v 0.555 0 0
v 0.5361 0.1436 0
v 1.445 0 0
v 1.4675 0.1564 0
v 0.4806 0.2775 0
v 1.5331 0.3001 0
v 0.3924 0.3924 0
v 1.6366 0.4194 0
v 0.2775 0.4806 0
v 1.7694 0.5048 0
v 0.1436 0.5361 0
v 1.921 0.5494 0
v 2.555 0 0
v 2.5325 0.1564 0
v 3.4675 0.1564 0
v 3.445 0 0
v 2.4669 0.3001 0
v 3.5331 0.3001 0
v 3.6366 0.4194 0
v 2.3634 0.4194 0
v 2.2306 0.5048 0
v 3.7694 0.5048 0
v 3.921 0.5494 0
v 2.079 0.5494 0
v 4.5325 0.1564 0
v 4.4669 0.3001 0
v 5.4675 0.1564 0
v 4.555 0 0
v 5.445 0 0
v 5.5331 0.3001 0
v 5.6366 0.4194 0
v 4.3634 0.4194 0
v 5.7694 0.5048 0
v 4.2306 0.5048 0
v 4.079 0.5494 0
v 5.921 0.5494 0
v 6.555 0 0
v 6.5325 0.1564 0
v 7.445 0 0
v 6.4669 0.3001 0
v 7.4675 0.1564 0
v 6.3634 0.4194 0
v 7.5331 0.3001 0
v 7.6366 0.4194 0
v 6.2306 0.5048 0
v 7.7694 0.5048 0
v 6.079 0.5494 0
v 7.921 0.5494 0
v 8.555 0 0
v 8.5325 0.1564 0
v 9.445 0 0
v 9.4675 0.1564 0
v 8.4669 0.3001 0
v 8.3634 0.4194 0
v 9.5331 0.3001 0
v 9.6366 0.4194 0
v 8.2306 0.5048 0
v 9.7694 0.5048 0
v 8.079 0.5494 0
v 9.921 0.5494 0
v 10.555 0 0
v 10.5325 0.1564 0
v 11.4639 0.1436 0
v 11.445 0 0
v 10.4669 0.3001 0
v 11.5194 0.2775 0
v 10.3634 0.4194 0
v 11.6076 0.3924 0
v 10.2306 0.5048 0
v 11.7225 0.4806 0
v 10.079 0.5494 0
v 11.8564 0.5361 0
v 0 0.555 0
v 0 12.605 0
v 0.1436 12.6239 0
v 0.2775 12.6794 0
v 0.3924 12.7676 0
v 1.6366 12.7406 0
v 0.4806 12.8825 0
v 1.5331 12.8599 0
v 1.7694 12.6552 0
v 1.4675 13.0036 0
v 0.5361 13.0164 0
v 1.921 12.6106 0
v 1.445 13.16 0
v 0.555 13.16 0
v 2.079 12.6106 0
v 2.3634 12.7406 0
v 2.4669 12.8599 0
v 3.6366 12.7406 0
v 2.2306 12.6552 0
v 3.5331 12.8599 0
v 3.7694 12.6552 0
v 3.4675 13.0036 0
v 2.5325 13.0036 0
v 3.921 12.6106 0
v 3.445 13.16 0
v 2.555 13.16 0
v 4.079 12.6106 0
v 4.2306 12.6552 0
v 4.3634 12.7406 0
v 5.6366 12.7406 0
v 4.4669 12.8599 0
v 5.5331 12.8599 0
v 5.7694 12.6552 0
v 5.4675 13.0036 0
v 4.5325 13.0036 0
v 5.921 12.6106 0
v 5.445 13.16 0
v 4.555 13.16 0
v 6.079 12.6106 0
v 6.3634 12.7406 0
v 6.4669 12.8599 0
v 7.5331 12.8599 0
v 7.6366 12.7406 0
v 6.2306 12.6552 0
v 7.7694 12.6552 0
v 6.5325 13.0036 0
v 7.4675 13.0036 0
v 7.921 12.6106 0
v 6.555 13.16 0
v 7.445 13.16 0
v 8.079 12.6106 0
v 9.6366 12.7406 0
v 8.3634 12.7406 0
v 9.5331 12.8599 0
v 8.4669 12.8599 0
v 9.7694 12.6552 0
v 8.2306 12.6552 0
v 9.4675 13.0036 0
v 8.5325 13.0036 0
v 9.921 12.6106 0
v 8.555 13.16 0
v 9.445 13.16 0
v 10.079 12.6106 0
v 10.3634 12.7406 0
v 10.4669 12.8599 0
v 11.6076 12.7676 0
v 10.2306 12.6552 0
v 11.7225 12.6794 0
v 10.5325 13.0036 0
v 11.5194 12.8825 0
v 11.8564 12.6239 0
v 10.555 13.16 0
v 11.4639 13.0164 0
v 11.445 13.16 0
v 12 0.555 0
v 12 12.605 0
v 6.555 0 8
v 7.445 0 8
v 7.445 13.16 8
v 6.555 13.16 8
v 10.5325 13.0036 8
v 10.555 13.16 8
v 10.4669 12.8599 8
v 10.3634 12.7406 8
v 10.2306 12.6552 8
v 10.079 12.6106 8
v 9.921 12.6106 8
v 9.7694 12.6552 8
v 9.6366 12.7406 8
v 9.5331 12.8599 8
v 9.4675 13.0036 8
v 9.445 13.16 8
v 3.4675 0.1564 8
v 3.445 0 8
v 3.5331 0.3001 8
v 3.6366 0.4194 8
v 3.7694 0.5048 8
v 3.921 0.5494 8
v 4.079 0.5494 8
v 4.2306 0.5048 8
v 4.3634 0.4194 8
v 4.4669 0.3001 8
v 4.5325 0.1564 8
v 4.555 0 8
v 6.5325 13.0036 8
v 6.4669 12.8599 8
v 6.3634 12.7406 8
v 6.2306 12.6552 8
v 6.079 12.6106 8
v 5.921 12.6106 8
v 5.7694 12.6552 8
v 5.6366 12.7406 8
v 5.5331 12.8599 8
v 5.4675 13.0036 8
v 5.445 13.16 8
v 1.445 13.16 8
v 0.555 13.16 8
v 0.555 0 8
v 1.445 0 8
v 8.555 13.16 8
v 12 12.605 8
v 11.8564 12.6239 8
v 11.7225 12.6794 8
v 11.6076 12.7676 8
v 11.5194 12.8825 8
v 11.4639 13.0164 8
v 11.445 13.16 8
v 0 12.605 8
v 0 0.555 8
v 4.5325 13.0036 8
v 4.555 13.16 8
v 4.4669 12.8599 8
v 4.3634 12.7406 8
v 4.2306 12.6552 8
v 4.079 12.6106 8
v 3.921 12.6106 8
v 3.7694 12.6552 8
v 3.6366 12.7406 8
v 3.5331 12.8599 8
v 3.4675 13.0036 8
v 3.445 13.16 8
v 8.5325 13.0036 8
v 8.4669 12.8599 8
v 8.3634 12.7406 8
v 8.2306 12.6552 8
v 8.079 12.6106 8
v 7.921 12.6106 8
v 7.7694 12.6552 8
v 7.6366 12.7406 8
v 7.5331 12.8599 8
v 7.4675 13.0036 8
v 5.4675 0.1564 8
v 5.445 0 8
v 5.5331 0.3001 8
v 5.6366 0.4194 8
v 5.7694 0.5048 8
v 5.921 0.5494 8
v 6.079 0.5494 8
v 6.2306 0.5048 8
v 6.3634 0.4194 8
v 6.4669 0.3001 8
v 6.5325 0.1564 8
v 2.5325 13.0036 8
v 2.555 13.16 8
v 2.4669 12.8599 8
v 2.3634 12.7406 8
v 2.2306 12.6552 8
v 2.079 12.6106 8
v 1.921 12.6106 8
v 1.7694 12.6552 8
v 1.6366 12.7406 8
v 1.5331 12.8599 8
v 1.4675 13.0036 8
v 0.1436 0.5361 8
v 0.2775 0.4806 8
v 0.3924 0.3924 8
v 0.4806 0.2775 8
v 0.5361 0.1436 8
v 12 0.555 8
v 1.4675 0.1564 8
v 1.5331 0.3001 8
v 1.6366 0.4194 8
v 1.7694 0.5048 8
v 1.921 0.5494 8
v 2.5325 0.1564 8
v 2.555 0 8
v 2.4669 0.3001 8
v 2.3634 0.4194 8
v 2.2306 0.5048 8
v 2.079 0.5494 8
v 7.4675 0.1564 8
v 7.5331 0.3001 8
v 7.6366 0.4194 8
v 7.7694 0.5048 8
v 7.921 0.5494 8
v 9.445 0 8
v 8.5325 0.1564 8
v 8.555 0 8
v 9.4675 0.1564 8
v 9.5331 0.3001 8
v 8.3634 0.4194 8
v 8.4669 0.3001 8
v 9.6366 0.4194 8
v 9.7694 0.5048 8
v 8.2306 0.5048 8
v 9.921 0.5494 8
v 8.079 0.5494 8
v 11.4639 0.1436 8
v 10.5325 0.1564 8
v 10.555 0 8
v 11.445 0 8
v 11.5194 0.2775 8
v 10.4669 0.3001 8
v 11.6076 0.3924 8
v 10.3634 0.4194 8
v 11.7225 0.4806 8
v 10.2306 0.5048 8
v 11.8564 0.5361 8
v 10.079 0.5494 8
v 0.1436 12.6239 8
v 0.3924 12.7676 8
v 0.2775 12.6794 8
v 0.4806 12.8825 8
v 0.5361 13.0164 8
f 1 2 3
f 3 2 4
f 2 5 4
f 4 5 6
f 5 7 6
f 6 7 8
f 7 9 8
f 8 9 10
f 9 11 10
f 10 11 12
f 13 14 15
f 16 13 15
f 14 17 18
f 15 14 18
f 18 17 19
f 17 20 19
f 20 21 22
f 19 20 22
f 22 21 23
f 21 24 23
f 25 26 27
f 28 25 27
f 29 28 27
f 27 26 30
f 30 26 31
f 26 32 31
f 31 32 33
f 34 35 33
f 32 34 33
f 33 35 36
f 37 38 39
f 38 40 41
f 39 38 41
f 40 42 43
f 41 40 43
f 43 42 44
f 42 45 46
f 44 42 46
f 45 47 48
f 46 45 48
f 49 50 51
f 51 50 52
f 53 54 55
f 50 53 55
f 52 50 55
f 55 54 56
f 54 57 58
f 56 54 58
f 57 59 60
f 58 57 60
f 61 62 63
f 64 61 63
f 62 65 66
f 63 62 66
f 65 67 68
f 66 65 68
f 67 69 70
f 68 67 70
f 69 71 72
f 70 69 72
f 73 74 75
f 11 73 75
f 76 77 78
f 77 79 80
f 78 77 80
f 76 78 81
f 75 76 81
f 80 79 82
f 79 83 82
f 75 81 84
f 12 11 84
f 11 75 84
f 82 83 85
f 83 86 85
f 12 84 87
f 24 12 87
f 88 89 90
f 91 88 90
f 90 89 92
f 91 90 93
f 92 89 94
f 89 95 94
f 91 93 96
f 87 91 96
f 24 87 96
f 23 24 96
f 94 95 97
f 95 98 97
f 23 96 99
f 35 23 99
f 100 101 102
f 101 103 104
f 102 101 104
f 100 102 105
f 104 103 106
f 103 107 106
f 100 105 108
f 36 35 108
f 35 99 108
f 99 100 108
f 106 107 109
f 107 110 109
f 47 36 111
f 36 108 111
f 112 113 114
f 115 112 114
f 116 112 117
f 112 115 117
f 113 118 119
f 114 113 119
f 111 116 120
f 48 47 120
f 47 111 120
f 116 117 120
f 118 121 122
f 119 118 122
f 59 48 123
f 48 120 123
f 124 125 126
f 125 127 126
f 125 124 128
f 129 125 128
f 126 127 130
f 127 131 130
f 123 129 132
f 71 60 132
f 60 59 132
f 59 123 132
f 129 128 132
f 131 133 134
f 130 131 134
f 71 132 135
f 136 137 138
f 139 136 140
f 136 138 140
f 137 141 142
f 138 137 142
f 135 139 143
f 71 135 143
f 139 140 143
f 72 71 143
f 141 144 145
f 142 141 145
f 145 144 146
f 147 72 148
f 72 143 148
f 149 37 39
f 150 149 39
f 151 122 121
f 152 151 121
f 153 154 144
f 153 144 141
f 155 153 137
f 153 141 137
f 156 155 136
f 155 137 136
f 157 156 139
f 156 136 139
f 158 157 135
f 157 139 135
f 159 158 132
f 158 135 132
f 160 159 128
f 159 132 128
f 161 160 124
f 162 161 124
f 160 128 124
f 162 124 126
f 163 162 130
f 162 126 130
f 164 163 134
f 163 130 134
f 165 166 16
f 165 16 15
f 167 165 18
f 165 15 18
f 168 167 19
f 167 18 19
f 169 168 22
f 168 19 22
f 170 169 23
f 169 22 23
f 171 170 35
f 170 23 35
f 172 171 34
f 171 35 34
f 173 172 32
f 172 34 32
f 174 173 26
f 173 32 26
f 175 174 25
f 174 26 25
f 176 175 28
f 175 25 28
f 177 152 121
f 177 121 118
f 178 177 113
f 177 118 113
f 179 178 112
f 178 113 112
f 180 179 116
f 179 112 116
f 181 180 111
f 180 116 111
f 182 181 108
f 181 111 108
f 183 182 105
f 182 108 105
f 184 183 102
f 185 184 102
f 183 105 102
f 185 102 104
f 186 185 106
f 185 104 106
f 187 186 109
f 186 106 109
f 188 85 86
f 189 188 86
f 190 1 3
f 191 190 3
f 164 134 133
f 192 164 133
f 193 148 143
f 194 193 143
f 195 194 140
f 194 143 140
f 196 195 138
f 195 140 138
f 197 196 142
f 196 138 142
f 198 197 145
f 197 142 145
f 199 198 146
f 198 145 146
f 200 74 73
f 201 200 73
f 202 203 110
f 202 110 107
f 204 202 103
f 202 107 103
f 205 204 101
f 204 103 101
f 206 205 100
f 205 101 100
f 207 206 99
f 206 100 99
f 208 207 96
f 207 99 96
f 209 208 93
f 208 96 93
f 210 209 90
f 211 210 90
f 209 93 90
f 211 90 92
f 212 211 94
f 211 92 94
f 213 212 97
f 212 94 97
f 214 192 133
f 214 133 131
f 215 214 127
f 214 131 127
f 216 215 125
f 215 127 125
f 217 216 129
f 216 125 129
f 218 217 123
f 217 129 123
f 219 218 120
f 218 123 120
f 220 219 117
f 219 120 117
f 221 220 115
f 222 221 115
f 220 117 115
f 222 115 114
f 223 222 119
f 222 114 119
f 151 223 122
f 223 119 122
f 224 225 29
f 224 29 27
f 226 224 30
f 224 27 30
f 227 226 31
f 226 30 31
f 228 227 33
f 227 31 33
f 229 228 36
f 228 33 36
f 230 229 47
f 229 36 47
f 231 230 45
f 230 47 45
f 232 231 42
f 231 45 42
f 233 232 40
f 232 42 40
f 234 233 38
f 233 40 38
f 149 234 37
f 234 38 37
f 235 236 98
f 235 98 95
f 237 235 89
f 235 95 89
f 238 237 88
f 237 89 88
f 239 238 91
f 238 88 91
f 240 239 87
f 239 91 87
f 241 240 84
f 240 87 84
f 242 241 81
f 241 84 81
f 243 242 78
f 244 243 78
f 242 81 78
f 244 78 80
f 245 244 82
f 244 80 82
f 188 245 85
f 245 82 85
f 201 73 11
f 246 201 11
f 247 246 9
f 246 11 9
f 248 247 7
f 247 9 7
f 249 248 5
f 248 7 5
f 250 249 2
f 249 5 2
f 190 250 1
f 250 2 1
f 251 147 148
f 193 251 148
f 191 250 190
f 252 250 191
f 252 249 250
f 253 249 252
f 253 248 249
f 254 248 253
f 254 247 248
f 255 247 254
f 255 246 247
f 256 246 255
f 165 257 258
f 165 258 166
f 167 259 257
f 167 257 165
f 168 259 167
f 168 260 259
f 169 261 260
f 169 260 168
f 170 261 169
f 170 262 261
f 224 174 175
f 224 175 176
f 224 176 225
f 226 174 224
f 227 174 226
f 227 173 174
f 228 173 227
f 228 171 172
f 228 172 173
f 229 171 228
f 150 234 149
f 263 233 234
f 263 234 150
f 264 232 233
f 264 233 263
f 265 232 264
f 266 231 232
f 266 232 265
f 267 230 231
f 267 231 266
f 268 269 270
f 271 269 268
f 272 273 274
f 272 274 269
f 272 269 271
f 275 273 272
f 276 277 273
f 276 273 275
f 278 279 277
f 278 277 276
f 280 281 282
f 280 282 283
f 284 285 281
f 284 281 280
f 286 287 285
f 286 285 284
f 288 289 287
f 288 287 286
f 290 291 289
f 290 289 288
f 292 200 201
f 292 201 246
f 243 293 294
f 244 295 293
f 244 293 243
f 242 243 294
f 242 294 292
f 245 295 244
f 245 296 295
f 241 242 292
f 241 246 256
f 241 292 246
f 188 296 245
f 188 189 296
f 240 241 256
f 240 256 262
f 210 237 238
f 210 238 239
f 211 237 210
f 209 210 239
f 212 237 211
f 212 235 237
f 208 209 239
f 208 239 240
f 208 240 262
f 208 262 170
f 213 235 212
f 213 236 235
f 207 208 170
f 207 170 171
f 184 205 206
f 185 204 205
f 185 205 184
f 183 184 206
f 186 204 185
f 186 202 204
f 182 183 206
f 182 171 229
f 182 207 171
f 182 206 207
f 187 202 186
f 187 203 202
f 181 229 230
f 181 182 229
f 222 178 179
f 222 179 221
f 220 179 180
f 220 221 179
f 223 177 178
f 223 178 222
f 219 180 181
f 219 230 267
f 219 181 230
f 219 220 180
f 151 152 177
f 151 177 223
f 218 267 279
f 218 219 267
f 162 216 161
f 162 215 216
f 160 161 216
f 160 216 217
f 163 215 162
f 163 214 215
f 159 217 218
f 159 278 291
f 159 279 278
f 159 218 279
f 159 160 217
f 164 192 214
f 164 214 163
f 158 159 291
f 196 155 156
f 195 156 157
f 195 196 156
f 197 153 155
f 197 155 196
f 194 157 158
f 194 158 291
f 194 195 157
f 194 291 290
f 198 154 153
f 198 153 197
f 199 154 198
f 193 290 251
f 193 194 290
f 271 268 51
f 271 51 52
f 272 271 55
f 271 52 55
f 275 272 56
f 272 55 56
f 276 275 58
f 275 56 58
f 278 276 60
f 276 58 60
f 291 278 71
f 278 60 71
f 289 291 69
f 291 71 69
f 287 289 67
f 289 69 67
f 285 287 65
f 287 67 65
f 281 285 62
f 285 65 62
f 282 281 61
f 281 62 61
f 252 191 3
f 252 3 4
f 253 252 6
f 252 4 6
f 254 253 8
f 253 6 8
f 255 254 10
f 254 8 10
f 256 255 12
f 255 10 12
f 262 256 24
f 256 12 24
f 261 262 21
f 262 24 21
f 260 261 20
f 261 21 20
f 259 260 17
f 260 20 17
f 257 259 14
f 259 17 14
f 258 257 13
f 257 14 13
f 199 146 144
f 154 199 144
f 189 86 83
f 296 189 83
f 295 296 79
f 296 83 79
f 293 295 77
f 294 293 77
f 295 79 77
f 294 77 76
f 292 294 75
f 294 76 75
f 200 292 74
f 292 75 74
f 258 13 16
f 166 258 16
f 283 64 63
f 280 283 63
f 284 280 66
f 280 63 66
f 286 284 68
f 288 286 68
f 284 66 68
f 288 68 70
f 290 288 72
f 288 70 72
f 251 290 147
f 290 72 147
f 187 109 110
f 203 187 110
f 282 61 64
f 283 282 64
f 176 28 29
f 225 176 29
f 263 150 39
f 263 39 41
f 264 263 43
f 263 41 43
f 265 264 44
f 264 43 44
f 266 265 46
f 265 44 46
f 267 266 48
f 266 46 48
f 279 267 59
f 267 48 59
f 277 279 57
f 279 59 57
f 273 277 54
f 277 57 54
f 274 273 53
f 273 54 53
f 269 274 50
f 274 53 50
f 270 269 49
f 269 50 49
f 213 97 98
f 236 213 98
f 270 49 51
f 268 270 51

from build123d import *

# Parameters (mm, degrees)
BOSS_EXTRUDE1_DEPTH = 8


with BuildPart() as part:
    # Sketch1 → Boss-Extrude1 (new body)
    with BuildSketch(Plane.XY):
        with BuildLine():
            Line((11.445, 13.16), (10.555, 13.16))
            ThreePointArc((10.555, 13.16), (10, 12.605), (9.445, 13.16))
            Line((9.445, 13.16), (8.555, 13.16))
            ThreePointArc((8.555, 13.16), (8, 12.605), (7.445, 13.16))
            Line((7.445, 13.16), (6.555, 13.16))
            ThreePointArc((6.555, 13.16), (6, 12.605), (5.445, 13.16))
            Line((5.445, 13.16), (4.555, 13.16))
            ThreePointArc((4.555, 13.16), (4, 12.605), (3.445, 13.16))
            Line((3.445, 13.16), (2.555, 13.16))
            ThreePointArc((2.555, 13.16), (2, 12.605), (1.445, 13.16))
            Line((1.445, 13.16), (0.555, 13.16))
            ThreePointArc((0.555, 13.16), (0.392444264, 12.767555736), (0, 12.605))
            Line((0, 12.605), (0, 0.555))
            ThreePointArc((0, 0.555), (0.392444264, 0.392444264), (0.555, 0))
            Line((0.555, 0), (1.445, 0))
            ThreePointArc((1.445, 0), (2, 0.555), (2.555, 0))
            Line((2.555, 0), (3.445, 0))
            ThreePointArc((3.445, 0), (4, 0.555), (4.555, 0))
            Line((4.555, 0), (5.445, 0))
            ThreePointArc((5.445, 0), (6, 0.555), (6.555, 0))
            Line((6.555, 0), (7.445, 0))
            ThreePointArc((7.445, 0), (8, 0.555), (8.555, 0))
            Line((8.555, 0), (9.445, 0))
            ThreePointArc((9.445, 0), (10, 0.555), (10.555, 0))
            Line((10.555, 0), (11.445, 0))
            ThreePointArc((11.445, 0), (11.607555736, 0.392444264), (12, 0.555))
            Line((12, 0.555), (12, 12.605))
            ThreePointArc((12, 12.605), (11.607555736, 12.767555736), (11.445, 13.16))
        make_face()
    extrude(amount=BOSS_EXTRUDE1_DEPTH)


solid = part.part
